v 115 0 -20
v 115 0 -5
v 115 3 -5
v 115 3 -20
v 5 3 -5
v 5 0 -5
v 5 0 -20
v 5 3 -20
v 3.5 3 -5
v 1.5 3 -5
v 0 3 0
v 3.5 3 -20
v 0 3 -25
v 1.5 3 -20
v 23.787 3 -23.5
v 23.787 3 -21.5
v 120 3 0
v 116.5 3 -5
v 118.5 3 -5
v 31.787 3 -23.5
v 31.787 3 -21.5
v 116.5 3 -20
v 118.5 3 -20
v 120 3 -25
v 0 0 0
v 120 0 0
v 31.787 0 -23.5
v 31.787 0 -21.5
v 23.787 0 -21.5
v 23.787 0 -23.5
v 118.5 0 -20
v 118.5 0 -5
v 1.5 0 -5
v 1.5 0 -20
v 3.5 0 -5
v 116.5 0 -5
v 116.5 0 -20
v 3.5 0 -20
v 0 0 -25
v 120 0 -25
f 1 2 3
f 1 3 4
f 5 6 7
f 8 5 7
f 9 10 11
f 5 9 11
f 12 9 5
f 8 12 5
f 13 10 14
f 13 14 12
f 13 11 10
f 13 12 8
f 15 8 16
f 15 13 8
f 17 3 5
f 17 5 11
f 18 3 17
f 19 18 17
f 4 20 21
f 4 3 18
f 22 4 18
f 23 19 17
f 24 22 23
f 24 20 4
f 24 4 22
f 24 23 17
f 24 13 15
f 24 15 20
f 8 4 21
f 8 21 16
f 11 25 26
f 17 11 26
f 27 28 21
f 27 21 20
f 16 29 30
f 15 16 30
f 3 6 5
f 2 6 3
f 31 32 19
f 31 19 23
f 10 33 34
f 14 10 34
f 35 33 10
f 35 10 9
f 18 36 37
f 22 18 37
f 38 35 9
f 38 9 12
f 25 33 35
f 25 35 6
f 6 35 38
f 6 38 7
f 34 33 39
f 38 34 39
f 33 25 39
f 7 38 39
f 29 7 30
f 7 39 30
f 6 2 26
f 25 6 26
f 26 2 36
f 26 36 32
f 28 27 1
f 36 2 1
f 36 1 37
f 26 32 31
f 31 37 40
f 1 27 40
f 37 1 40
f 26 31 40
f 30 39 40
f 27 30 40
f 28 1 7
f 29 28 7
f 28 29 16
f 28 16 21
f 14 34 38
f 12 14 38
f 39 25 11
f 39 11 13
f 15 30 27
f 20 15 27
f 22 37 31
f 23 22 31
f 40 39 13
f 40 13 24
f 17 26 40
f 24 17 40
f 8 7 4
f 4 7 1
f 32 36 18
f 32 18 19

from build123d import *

# Parameters (mm, degrees)
SKETCH1_W           = 120
SKETCH1_H           = 25
SKETCH1_W_2         = 110
SKETCH1_H_2         = 15
SKETCH1_W_3         = 2
SKETCH1_W_4         = 8
SKETCH1_H_3         = 2
BOSS_EXTRUDE1_DEPTH = 3


with BuildPart() as part:
    # Sketch1 → Boss-Extrude1 (new body)
    with BuildSketch(Plane(origin=(0, 0, 0), x_dir=(1, 0, 0), z_dir=(0, 1, 0))):
        with Locations((60, 12.5)):
            Rectangle(SKETCH1_W, SKETCH1_H)
        with Locations((60, 12.5)):
            Rectangle(SKETCH1_W_2, SKETCH1_H_2, mode=Mode.SUBTRACT)
        with Locations((2.5, 12.5)):
            Rectangle(SKETCH1_W_3, SKETCH1_H_2, mode=Mode.SUBTRACT)
        with Locations((117.5, 12.5)):
            Rectangle(SKETCH1_W_3, SKETCH1_H_2, mode=Mode.SUBTRACT)
        with Locations((27.787478482, 22.5)):
            Rectangle(SKETCH1_W_4, SKETCH1_H_3, mode=Mode.SUBTRACT)
    extrude(amount=BOSS_EXTRUDE1_DEPTH)


solid = part.part
